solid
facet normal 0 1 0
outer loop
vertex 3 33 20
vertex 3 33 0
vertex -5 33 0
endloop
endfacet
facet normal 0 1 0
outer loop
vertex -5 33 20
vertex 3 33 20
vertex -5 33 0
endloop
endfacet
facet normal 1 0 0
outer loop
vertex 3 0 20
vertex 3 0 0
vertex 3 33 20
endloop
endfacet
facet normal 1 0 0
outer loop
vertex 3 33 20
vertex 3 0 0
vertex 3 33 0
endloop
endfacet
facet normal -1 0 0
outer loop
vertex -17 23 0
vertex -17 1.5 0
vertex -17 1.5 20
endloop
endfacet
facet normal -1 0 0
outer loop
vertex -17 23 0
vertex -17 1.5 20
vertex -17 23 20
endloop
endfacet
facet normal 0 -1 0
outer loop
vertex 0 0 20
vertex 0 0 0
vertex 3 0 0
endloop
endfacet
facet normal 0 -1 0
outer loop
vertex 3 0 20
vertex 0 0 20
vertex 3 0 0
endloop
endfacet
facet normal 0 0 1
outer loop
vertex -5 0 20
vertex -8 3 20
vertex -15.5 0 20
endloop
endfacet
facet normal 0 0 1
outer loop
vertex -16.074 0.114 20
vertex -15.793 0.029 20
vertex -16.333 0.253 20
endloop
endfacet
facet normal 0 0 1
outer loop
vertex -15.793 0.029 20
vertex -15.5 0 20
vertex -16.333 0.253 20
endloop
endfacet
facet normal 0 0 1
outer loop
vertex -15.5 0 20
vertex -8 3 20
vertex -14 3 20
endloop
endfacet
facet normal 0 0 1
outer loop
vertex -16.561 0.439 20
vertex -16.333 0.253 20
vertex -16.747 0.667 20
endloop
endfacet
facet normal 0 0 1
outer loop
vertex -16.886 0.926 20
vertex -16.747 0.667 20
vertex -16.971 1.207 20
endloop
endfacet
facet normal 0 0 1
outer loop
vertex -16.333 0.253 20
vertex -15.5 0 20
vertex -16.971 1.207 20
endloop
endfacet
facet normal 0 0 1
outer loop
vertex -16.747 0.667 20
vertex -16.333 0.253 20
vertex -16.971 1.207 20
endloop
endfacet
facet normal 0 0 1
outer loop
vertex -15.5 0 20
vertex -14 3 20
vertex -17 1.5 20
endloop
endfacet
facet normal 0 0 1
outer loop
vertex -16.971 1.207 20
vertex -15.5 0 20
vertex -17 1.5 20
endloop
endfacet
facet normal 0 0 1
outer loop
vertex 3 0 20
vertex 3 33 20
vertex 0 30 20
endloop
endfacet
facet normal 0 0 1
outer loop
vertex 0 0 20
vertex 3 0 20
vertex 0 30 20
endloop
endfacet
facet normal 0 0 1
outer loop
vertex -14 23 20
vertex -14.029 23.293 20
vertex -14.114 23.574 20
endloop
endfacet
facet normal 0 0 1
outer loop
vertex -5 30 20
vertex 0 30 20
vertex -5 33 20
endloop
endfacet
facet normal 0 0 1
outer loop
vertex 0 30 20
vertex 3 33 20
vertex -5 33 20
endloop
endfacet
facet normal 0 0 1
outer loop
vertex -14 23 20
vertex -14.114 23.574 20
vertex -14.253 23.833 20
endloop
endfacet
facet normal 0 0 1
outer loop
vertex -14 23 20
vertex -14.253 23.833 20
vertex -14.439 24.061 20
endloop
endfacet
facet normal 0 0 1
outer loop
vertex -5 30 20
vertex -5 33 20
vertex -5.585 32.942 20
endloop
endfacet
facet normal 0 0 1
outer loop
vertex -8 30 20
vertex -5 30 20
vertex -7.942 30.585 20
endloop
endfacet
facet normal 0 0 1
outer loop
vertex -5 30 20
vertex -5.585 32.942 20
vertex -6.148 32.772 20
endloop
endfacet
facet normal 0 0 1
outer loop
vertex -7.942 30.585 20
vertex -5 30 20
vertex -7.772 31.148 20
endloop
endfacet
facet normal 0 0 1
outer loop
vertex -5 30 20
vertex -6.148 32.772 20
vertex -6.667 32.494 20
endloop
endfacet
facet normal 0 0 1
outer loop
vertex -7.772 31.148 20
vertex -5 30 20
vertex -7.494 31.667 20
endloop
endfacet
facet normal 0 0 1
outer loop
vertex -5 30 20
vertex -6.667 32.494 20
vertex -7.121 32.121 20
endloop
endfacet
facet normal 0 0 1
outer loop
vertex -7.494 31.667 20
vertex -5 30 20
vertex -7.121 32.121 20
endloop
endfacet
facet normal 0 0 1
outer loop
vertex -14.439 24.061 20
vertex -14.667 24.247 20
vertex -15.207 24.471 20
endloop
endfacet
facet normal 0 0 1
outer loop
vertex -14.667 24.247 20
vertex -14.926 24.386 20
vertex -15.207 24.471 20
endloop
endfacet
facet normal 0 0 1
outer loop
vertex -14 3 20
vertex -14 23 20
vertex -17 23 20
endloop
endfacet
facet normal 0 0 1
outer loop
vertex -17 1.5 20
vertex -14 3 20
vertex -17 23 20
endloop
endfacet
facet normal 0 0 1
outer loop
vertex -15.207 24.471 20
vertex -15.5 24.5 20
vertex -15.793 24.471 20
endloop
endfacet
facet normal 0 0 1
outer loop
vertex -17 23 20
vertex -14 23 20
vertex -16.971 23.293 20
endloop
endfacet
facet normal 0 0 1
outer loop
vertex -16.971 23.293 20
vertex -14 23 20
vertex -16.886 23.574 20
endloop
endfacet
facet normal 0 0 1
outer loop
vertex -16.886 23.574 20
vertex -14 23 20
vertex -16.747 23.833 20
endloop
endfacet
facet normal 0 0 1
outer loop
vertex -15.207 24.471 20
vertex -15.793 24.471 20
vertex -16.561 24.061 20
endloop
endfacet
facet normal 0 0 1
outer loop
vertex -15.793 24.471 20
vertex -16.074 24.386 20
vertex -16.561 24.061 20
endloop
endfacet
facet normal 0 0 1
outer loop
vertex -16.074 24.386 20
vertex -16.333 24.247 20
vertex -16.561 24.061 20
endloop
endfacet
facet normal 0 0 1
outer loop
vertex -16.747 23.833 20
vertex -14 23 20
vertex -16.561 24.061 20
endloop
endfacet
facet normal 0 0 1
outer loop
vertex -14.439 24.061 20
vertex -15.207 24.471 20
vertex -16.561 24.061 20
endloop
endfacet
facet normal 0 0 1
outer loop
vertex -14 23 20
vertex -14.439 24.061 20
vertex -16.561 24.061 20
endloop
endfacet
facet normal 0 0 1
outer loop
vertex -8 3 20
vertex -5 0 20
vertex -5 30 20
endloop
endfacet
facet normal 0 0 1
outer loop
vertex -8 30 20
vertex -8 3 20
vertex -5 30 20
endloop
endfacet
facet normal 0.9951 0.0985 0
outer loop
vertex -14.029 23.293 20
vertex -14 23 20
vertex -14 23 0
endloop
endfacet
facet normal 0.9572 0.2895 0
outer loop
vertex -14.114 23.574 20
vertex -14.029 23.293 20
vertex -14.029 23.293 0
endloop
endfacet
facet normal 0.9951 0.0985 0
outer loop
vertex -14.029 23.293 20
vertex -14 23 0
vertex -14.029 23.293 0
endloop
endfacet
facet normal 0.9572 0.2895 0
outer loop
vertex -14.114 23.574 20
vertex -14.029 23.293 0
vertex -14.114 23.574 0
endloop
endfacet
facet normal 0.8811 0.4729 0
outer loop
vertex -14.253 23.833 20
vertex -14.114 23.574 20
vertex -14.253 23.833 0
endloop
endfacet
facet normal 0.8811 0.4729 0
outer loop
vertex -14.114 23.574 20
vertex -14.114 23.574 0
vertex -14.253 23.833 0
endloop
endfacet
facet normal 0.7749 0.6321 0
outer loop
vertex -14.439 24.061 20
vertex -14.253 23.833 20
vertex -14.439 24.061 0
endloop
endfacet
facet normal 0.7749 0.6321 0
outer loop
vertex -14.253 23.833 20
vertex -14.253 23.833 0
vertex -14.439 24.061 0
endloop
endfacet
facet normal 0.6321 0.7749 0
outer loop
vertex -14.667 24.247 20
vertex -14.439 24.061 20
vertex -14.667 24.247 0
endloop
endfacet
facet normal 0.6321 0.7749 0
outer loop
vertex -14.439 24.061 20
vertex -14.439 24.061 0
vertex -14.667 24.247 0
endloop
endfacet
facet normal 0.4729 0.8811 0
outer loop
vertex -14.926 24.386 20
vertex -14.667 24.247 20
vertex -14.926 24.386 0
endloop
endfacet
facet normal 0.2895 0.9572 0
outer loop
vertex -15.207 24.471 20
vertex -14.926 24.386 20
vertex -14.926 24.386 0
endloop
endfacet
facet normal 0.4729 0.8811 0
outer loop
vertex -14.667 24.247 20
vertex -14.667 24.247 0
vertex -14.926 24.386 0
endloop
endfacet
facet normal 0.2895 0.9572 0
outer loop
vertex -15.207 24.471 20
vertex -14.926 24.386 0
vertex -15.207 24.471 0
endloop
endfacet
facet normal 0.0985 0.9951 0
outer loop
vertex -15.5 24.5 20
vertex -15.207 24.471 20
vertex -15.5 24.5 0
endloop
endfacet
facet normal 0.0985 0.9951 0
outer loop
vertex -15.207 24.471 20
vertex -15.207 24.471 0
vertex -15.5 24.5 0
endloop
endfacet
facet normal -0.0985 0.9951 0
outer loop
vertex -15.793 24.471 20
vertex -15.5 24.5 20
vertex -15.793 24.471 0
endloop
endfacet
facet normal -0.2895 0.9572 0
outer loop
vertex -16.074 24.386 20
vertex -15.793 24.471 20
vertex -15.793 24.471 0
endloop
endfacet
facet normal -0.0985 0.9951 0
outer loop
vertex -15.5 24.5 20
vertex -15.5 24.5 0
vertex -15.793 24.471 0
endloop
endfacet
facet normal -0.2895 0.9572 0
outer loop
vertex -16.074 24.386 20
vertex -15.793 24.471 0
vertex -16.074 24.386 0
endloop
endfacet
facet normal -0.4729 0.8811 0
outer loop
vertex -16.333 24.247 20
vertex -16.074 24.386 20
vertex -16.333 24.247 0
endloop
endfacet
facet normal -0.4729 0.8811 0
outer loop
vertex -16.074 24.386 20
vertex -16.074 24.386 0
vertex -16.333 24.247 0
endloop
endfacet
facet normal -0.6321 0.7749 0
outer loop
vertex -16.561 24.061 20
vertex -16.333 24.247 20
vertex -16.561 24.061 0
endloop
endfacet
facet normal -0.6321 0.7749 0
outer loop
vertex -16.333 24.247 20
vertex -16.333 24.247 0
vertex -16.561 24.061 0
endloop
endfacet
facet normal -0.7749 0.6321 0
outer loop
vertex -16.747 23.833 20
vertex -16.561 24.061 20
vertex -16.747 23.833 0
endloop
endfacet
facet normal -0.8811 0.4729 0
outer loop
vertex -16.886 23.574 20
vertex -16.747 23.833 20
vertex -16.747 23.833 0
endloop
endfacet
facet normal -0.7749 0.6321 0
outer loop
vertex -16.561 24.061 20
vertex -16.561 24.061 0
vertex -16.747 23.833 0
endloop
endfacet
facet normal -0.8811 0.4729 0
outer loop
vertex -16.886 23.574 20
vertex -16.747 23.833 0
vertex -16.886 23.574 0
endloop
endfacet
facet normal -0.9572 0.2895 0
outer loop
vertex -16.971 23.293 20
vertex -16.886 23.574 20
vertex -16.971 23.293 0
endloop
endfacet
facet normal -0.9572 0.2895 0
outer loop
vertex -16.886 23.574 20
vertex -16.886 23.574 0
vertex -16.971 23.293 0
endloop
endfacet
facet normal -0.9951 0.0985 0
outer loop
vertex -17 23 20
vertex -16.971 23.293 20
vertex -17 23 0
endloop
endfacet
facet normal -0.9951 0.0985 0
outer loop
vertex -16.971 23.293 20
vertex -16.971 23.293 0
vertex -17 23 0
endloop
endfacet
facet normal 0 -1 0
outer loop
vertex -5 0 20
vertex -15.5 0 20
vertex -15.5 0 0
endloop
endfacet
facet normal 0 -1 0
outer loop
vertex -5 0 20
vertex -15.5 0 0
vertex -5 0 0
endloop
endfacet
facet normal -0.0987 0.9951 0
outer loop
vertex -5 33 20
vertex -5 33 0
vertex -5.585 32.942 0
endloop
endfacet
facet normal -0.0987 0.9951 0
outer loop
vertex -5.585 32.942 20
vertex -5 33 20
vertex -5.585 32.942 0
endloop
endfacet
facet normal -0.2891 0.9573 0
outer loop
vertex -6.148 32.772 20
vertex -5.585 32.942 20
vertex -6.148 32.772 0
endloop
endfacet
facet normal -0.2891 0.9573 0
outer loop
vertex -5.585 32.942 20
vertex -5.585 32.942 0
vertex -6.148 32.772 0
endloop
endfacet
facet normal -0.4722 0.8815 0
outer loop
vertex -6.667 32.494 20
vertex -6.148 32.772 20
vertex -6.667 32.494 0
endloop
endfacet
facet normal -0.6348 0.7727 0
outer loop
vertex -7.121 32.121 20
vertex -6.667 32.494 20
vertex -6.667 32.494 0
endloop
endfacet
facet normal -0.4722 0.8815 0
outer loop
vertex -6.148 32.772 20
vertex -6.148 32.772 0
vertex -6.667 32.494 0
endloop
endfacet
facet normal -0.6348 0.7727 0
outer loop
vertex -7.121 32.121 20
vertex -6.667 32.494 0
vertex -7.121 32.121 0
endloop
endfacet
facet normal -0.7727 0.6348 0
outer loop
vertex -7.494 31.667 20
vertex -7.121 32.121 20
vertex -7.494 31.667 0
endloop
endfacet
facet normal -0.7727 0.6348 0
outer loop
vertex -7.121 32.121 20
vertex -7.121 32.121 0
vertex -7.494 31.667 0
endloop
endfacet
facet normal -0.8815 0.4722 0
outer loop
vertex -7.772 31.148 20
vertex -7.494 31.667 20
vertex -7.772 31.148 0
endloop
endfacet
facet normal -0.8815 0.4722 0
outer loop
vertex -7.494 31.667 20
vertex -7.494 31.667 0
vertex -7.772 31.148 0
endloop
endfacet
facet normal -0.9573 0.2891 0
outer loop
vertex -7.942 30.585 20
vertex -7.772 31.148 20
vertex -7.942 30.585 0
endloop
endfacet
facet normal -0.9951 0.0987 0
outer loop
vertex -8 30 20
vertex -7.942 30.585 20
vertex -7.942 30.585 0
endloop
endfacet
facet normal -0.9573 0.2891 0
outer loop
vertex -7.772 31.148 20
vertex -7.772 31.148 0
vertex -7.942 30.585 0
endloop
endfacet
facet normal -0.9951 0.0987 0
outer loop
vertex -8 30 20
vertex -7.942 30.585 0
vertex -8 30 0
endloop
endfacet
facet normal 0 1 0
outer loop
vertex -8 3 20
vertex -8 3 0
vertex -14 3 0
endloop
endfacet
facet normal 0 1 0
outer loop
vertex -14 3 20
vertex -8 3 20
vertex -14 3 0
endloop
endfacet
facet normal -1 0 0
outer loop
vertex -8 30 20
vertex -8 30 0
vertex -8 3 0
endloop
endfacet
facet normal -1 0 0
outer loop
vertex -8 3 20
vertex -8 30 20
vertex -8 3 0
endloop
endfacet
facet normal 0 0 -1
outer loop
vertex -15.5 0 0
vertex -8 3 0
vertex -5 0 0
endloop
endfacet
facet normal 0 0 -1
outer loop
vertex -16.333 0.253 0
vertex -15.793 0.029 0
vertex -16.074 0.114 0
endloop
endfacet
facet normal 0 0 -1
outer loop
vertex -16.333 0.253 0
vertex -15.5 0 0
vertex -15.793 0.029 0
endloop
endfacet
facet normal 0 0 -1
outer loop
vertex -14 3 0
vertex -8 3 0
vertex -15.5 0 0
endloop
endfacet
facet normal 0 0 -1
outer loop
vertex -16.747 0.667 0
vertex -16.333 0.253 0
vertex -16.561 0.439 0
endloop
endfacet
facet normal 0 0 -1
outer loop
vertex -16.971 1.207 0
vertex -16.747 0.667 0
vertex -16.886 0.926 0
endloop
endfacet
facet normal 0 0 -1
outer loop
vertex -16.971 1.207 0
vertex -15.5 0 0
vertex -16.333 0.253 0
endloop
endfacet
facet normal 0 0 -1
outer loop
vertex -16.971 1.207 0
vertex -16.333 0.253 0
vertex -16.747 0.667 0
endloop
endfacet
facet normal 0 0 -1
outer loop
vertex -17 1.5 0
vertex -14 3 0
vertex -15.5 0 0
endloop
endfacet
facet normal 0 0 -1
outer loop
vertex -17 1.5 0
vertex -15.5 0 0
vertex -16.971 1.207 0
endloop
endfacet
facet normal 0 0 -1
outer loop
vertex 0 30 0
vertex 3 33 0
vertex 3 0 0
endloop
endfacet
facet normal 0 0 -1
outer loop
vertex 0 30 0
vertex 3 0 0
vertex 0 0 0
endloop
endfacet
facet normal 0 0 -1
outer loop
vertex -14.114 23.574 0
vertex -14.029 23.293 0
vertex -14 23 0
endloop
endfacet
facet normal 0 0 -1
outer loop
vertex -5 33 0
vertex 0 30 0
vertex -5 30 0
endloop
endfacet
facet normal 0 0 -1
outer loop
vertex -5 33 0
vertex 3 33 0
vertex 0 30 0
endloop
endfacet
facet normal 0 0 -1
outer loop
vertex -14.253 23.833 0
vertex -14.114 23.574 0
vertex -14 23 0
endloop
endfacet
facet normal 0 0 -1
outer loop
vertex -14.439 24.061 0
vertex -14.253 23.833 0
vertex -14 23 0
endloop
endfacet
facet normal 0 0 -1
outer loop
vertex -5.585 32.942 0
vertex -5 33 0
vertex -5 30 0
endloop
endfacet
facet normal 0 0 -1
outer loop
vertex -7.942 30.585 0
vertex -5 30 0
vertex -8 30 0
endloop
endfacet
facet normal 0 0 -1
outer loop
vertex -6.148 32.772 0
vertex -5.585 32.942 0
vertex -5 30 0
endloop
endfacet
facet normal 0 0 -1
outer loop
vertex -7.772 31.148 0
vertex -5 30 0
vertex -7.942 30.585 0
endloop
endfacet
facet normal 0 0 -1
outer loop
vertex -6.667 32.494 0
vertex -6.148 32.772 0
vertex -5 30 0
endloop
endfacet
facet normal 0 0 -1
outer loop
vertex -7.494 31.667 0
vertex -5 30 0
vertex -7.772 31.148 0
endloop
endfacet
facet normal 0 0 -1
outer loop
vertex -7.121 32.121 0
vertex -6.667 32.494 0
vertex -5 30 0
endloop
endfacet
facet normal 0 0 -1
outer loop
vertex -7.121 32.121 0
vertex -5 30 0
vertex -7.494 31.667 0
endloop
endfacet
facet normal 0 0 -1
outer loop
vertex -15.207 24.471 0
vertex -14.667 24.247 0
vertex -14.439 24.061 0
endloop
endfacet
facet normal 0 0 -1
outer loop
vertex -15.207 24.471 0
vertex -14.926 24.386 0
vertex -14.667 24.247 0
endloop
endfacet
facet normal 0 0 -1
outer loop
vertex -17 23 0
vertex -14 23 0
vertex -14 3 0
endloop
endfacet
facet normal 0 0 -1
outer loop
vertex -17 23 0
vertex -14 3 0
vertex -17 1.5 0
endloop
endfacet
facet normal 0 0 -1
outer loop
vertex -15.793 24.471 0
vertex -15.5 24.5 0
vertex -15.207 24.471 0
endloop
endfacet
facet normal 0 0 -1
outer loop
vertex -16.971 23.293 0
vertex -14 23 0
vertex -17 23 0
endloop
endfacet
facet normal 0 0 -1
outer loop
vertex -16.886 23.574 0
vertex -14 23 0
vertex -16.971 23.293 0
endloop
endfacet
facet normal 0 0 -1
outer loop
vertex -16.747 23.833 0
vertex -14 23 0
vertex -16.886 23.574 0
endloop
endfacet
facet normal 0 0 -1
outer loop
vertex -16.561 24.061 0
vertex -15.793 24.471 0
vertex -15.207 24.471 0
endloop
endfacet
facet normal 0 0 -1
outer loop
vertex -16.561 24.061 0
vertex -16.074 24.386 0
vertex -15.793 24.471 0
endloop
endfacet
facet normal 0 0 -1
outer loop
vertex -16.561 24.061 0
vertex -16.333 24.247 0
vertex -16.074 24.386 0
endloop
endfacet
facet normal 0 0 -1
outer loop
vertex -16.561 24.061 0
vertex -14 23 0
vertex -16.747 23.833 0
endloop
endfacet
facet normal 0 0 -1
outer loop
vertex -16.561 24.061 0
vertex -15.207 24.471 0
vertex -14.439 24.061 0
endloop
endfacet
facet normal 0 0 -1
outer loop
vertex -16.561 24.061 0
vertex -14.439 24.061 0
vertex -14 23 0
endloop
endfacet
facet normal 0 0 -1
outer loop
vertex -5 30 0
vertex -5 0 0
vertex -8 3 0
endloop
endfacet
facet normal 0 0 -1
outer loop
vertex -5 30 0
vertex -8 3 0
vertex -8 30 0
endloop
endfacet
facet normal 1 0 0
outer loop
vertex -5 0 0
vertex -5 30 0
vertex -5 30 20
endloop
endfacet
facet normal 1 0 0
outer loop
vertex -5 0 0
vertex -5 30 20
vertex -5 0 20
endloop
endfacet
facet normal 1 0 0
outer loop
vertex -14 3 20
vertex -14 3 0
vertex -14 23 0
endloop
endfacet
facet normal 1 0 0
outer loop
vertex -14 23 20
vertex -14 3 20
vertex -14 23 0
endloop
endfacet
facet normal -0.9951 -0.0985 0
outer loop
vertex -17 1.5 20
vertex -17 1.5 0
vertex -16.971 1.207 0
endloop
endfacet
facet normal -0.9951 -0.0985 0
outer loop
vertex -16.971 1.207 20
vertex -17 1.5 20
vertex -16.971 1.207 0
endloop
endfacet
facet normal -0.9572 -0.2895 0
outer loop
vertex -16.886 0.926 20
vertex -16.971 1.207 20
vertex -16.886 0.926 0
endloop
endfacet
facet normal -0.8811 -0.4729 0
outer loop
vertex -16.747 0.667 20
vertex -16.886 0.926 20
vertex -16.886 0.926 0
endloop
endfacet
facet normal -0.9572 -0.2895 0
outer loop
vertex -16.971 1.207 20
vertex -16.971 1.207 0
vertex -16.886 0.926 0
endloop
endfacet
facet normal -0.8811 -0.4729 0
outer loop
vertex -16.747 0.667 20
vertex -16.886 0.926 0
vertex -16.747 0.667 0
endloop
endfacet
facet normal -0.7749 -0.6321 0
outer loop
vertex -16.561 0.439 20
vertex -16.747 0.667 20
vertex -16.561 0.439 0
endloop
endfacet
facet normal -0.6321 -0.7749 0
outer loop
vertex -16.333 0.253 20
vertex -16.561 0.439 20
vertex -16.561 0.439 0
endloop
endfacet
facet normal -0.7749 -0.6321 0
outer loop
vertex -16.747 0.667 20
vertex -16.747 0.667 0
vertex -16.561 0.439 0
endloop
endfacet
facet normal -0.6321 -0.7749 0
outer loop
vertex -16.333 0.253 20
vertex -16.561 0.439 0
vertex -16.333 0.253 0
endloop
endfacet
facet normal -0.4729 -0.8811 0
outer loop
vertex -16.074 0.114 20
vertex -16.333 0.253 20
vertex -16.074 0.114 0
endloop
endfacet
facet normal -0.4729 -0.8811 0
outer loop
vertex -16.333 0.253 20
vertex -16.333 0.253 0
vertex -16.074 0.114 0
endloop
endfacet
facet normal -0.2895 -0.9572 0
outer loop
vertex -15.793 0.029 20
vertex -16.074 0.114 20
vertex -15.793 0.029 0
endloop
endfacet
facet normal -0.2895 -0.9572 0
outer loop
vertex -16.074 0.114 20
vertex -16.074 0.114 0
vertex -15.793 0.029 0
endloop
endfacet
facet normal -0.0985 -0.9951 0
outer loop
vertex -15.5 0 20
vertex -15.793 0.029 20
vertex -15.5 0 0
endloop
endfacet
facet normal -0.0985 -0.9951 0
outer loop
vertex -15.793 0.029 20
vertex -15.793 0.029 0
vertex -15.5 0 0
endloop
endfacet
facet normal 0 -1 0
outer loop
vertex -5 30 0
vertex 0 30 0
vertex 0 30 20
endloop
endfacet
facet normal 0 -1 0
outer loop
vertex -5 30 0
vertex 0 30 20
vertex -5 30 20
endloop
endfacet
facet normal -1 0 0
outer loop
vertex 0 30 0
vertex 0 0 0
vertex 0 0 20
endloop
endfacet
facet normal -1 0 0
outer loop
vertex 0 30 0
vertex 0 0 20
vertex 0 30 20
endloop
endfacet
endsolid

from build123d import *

# Parameters (mm, degrees)
PAD_DEPTH = 20


with BuildPart() as part:
    # Sketch → Pad (new body)
    with BuildSketch(Plane.XY):
        with BuildLine():
            Line((0, 0), (0, 30))
            Line((0, 30), (-5, 30))
            Line((-5, 30), (-5, 0))
            Line((-15.5, 0), (-5, 0))
            ThreePointArc((-17, 1.5), (-16.56066, 0.43934), (-15.5, 0))
            Line((-17, 1.5), (-17, 23))
            ThreePointArc((-14, 23), (-15.5, 24.5), (-17, 23))
            Line((-14, 3), (-14, 23))
            Line((-8, 3), (-14, 3))
            Line((-8, 30), (-8, 3))
            ThreePointArc((-5, 33), (-7.12132, 32.12132), (-8, 30))
            Line((3, 33), (-5, 33))
            Line((3, 0), (3, 33))
            Line((0, 0), (3, 0))
        make_face()
    extrude(amount=PAD_DEPTH)


solid = part.part
